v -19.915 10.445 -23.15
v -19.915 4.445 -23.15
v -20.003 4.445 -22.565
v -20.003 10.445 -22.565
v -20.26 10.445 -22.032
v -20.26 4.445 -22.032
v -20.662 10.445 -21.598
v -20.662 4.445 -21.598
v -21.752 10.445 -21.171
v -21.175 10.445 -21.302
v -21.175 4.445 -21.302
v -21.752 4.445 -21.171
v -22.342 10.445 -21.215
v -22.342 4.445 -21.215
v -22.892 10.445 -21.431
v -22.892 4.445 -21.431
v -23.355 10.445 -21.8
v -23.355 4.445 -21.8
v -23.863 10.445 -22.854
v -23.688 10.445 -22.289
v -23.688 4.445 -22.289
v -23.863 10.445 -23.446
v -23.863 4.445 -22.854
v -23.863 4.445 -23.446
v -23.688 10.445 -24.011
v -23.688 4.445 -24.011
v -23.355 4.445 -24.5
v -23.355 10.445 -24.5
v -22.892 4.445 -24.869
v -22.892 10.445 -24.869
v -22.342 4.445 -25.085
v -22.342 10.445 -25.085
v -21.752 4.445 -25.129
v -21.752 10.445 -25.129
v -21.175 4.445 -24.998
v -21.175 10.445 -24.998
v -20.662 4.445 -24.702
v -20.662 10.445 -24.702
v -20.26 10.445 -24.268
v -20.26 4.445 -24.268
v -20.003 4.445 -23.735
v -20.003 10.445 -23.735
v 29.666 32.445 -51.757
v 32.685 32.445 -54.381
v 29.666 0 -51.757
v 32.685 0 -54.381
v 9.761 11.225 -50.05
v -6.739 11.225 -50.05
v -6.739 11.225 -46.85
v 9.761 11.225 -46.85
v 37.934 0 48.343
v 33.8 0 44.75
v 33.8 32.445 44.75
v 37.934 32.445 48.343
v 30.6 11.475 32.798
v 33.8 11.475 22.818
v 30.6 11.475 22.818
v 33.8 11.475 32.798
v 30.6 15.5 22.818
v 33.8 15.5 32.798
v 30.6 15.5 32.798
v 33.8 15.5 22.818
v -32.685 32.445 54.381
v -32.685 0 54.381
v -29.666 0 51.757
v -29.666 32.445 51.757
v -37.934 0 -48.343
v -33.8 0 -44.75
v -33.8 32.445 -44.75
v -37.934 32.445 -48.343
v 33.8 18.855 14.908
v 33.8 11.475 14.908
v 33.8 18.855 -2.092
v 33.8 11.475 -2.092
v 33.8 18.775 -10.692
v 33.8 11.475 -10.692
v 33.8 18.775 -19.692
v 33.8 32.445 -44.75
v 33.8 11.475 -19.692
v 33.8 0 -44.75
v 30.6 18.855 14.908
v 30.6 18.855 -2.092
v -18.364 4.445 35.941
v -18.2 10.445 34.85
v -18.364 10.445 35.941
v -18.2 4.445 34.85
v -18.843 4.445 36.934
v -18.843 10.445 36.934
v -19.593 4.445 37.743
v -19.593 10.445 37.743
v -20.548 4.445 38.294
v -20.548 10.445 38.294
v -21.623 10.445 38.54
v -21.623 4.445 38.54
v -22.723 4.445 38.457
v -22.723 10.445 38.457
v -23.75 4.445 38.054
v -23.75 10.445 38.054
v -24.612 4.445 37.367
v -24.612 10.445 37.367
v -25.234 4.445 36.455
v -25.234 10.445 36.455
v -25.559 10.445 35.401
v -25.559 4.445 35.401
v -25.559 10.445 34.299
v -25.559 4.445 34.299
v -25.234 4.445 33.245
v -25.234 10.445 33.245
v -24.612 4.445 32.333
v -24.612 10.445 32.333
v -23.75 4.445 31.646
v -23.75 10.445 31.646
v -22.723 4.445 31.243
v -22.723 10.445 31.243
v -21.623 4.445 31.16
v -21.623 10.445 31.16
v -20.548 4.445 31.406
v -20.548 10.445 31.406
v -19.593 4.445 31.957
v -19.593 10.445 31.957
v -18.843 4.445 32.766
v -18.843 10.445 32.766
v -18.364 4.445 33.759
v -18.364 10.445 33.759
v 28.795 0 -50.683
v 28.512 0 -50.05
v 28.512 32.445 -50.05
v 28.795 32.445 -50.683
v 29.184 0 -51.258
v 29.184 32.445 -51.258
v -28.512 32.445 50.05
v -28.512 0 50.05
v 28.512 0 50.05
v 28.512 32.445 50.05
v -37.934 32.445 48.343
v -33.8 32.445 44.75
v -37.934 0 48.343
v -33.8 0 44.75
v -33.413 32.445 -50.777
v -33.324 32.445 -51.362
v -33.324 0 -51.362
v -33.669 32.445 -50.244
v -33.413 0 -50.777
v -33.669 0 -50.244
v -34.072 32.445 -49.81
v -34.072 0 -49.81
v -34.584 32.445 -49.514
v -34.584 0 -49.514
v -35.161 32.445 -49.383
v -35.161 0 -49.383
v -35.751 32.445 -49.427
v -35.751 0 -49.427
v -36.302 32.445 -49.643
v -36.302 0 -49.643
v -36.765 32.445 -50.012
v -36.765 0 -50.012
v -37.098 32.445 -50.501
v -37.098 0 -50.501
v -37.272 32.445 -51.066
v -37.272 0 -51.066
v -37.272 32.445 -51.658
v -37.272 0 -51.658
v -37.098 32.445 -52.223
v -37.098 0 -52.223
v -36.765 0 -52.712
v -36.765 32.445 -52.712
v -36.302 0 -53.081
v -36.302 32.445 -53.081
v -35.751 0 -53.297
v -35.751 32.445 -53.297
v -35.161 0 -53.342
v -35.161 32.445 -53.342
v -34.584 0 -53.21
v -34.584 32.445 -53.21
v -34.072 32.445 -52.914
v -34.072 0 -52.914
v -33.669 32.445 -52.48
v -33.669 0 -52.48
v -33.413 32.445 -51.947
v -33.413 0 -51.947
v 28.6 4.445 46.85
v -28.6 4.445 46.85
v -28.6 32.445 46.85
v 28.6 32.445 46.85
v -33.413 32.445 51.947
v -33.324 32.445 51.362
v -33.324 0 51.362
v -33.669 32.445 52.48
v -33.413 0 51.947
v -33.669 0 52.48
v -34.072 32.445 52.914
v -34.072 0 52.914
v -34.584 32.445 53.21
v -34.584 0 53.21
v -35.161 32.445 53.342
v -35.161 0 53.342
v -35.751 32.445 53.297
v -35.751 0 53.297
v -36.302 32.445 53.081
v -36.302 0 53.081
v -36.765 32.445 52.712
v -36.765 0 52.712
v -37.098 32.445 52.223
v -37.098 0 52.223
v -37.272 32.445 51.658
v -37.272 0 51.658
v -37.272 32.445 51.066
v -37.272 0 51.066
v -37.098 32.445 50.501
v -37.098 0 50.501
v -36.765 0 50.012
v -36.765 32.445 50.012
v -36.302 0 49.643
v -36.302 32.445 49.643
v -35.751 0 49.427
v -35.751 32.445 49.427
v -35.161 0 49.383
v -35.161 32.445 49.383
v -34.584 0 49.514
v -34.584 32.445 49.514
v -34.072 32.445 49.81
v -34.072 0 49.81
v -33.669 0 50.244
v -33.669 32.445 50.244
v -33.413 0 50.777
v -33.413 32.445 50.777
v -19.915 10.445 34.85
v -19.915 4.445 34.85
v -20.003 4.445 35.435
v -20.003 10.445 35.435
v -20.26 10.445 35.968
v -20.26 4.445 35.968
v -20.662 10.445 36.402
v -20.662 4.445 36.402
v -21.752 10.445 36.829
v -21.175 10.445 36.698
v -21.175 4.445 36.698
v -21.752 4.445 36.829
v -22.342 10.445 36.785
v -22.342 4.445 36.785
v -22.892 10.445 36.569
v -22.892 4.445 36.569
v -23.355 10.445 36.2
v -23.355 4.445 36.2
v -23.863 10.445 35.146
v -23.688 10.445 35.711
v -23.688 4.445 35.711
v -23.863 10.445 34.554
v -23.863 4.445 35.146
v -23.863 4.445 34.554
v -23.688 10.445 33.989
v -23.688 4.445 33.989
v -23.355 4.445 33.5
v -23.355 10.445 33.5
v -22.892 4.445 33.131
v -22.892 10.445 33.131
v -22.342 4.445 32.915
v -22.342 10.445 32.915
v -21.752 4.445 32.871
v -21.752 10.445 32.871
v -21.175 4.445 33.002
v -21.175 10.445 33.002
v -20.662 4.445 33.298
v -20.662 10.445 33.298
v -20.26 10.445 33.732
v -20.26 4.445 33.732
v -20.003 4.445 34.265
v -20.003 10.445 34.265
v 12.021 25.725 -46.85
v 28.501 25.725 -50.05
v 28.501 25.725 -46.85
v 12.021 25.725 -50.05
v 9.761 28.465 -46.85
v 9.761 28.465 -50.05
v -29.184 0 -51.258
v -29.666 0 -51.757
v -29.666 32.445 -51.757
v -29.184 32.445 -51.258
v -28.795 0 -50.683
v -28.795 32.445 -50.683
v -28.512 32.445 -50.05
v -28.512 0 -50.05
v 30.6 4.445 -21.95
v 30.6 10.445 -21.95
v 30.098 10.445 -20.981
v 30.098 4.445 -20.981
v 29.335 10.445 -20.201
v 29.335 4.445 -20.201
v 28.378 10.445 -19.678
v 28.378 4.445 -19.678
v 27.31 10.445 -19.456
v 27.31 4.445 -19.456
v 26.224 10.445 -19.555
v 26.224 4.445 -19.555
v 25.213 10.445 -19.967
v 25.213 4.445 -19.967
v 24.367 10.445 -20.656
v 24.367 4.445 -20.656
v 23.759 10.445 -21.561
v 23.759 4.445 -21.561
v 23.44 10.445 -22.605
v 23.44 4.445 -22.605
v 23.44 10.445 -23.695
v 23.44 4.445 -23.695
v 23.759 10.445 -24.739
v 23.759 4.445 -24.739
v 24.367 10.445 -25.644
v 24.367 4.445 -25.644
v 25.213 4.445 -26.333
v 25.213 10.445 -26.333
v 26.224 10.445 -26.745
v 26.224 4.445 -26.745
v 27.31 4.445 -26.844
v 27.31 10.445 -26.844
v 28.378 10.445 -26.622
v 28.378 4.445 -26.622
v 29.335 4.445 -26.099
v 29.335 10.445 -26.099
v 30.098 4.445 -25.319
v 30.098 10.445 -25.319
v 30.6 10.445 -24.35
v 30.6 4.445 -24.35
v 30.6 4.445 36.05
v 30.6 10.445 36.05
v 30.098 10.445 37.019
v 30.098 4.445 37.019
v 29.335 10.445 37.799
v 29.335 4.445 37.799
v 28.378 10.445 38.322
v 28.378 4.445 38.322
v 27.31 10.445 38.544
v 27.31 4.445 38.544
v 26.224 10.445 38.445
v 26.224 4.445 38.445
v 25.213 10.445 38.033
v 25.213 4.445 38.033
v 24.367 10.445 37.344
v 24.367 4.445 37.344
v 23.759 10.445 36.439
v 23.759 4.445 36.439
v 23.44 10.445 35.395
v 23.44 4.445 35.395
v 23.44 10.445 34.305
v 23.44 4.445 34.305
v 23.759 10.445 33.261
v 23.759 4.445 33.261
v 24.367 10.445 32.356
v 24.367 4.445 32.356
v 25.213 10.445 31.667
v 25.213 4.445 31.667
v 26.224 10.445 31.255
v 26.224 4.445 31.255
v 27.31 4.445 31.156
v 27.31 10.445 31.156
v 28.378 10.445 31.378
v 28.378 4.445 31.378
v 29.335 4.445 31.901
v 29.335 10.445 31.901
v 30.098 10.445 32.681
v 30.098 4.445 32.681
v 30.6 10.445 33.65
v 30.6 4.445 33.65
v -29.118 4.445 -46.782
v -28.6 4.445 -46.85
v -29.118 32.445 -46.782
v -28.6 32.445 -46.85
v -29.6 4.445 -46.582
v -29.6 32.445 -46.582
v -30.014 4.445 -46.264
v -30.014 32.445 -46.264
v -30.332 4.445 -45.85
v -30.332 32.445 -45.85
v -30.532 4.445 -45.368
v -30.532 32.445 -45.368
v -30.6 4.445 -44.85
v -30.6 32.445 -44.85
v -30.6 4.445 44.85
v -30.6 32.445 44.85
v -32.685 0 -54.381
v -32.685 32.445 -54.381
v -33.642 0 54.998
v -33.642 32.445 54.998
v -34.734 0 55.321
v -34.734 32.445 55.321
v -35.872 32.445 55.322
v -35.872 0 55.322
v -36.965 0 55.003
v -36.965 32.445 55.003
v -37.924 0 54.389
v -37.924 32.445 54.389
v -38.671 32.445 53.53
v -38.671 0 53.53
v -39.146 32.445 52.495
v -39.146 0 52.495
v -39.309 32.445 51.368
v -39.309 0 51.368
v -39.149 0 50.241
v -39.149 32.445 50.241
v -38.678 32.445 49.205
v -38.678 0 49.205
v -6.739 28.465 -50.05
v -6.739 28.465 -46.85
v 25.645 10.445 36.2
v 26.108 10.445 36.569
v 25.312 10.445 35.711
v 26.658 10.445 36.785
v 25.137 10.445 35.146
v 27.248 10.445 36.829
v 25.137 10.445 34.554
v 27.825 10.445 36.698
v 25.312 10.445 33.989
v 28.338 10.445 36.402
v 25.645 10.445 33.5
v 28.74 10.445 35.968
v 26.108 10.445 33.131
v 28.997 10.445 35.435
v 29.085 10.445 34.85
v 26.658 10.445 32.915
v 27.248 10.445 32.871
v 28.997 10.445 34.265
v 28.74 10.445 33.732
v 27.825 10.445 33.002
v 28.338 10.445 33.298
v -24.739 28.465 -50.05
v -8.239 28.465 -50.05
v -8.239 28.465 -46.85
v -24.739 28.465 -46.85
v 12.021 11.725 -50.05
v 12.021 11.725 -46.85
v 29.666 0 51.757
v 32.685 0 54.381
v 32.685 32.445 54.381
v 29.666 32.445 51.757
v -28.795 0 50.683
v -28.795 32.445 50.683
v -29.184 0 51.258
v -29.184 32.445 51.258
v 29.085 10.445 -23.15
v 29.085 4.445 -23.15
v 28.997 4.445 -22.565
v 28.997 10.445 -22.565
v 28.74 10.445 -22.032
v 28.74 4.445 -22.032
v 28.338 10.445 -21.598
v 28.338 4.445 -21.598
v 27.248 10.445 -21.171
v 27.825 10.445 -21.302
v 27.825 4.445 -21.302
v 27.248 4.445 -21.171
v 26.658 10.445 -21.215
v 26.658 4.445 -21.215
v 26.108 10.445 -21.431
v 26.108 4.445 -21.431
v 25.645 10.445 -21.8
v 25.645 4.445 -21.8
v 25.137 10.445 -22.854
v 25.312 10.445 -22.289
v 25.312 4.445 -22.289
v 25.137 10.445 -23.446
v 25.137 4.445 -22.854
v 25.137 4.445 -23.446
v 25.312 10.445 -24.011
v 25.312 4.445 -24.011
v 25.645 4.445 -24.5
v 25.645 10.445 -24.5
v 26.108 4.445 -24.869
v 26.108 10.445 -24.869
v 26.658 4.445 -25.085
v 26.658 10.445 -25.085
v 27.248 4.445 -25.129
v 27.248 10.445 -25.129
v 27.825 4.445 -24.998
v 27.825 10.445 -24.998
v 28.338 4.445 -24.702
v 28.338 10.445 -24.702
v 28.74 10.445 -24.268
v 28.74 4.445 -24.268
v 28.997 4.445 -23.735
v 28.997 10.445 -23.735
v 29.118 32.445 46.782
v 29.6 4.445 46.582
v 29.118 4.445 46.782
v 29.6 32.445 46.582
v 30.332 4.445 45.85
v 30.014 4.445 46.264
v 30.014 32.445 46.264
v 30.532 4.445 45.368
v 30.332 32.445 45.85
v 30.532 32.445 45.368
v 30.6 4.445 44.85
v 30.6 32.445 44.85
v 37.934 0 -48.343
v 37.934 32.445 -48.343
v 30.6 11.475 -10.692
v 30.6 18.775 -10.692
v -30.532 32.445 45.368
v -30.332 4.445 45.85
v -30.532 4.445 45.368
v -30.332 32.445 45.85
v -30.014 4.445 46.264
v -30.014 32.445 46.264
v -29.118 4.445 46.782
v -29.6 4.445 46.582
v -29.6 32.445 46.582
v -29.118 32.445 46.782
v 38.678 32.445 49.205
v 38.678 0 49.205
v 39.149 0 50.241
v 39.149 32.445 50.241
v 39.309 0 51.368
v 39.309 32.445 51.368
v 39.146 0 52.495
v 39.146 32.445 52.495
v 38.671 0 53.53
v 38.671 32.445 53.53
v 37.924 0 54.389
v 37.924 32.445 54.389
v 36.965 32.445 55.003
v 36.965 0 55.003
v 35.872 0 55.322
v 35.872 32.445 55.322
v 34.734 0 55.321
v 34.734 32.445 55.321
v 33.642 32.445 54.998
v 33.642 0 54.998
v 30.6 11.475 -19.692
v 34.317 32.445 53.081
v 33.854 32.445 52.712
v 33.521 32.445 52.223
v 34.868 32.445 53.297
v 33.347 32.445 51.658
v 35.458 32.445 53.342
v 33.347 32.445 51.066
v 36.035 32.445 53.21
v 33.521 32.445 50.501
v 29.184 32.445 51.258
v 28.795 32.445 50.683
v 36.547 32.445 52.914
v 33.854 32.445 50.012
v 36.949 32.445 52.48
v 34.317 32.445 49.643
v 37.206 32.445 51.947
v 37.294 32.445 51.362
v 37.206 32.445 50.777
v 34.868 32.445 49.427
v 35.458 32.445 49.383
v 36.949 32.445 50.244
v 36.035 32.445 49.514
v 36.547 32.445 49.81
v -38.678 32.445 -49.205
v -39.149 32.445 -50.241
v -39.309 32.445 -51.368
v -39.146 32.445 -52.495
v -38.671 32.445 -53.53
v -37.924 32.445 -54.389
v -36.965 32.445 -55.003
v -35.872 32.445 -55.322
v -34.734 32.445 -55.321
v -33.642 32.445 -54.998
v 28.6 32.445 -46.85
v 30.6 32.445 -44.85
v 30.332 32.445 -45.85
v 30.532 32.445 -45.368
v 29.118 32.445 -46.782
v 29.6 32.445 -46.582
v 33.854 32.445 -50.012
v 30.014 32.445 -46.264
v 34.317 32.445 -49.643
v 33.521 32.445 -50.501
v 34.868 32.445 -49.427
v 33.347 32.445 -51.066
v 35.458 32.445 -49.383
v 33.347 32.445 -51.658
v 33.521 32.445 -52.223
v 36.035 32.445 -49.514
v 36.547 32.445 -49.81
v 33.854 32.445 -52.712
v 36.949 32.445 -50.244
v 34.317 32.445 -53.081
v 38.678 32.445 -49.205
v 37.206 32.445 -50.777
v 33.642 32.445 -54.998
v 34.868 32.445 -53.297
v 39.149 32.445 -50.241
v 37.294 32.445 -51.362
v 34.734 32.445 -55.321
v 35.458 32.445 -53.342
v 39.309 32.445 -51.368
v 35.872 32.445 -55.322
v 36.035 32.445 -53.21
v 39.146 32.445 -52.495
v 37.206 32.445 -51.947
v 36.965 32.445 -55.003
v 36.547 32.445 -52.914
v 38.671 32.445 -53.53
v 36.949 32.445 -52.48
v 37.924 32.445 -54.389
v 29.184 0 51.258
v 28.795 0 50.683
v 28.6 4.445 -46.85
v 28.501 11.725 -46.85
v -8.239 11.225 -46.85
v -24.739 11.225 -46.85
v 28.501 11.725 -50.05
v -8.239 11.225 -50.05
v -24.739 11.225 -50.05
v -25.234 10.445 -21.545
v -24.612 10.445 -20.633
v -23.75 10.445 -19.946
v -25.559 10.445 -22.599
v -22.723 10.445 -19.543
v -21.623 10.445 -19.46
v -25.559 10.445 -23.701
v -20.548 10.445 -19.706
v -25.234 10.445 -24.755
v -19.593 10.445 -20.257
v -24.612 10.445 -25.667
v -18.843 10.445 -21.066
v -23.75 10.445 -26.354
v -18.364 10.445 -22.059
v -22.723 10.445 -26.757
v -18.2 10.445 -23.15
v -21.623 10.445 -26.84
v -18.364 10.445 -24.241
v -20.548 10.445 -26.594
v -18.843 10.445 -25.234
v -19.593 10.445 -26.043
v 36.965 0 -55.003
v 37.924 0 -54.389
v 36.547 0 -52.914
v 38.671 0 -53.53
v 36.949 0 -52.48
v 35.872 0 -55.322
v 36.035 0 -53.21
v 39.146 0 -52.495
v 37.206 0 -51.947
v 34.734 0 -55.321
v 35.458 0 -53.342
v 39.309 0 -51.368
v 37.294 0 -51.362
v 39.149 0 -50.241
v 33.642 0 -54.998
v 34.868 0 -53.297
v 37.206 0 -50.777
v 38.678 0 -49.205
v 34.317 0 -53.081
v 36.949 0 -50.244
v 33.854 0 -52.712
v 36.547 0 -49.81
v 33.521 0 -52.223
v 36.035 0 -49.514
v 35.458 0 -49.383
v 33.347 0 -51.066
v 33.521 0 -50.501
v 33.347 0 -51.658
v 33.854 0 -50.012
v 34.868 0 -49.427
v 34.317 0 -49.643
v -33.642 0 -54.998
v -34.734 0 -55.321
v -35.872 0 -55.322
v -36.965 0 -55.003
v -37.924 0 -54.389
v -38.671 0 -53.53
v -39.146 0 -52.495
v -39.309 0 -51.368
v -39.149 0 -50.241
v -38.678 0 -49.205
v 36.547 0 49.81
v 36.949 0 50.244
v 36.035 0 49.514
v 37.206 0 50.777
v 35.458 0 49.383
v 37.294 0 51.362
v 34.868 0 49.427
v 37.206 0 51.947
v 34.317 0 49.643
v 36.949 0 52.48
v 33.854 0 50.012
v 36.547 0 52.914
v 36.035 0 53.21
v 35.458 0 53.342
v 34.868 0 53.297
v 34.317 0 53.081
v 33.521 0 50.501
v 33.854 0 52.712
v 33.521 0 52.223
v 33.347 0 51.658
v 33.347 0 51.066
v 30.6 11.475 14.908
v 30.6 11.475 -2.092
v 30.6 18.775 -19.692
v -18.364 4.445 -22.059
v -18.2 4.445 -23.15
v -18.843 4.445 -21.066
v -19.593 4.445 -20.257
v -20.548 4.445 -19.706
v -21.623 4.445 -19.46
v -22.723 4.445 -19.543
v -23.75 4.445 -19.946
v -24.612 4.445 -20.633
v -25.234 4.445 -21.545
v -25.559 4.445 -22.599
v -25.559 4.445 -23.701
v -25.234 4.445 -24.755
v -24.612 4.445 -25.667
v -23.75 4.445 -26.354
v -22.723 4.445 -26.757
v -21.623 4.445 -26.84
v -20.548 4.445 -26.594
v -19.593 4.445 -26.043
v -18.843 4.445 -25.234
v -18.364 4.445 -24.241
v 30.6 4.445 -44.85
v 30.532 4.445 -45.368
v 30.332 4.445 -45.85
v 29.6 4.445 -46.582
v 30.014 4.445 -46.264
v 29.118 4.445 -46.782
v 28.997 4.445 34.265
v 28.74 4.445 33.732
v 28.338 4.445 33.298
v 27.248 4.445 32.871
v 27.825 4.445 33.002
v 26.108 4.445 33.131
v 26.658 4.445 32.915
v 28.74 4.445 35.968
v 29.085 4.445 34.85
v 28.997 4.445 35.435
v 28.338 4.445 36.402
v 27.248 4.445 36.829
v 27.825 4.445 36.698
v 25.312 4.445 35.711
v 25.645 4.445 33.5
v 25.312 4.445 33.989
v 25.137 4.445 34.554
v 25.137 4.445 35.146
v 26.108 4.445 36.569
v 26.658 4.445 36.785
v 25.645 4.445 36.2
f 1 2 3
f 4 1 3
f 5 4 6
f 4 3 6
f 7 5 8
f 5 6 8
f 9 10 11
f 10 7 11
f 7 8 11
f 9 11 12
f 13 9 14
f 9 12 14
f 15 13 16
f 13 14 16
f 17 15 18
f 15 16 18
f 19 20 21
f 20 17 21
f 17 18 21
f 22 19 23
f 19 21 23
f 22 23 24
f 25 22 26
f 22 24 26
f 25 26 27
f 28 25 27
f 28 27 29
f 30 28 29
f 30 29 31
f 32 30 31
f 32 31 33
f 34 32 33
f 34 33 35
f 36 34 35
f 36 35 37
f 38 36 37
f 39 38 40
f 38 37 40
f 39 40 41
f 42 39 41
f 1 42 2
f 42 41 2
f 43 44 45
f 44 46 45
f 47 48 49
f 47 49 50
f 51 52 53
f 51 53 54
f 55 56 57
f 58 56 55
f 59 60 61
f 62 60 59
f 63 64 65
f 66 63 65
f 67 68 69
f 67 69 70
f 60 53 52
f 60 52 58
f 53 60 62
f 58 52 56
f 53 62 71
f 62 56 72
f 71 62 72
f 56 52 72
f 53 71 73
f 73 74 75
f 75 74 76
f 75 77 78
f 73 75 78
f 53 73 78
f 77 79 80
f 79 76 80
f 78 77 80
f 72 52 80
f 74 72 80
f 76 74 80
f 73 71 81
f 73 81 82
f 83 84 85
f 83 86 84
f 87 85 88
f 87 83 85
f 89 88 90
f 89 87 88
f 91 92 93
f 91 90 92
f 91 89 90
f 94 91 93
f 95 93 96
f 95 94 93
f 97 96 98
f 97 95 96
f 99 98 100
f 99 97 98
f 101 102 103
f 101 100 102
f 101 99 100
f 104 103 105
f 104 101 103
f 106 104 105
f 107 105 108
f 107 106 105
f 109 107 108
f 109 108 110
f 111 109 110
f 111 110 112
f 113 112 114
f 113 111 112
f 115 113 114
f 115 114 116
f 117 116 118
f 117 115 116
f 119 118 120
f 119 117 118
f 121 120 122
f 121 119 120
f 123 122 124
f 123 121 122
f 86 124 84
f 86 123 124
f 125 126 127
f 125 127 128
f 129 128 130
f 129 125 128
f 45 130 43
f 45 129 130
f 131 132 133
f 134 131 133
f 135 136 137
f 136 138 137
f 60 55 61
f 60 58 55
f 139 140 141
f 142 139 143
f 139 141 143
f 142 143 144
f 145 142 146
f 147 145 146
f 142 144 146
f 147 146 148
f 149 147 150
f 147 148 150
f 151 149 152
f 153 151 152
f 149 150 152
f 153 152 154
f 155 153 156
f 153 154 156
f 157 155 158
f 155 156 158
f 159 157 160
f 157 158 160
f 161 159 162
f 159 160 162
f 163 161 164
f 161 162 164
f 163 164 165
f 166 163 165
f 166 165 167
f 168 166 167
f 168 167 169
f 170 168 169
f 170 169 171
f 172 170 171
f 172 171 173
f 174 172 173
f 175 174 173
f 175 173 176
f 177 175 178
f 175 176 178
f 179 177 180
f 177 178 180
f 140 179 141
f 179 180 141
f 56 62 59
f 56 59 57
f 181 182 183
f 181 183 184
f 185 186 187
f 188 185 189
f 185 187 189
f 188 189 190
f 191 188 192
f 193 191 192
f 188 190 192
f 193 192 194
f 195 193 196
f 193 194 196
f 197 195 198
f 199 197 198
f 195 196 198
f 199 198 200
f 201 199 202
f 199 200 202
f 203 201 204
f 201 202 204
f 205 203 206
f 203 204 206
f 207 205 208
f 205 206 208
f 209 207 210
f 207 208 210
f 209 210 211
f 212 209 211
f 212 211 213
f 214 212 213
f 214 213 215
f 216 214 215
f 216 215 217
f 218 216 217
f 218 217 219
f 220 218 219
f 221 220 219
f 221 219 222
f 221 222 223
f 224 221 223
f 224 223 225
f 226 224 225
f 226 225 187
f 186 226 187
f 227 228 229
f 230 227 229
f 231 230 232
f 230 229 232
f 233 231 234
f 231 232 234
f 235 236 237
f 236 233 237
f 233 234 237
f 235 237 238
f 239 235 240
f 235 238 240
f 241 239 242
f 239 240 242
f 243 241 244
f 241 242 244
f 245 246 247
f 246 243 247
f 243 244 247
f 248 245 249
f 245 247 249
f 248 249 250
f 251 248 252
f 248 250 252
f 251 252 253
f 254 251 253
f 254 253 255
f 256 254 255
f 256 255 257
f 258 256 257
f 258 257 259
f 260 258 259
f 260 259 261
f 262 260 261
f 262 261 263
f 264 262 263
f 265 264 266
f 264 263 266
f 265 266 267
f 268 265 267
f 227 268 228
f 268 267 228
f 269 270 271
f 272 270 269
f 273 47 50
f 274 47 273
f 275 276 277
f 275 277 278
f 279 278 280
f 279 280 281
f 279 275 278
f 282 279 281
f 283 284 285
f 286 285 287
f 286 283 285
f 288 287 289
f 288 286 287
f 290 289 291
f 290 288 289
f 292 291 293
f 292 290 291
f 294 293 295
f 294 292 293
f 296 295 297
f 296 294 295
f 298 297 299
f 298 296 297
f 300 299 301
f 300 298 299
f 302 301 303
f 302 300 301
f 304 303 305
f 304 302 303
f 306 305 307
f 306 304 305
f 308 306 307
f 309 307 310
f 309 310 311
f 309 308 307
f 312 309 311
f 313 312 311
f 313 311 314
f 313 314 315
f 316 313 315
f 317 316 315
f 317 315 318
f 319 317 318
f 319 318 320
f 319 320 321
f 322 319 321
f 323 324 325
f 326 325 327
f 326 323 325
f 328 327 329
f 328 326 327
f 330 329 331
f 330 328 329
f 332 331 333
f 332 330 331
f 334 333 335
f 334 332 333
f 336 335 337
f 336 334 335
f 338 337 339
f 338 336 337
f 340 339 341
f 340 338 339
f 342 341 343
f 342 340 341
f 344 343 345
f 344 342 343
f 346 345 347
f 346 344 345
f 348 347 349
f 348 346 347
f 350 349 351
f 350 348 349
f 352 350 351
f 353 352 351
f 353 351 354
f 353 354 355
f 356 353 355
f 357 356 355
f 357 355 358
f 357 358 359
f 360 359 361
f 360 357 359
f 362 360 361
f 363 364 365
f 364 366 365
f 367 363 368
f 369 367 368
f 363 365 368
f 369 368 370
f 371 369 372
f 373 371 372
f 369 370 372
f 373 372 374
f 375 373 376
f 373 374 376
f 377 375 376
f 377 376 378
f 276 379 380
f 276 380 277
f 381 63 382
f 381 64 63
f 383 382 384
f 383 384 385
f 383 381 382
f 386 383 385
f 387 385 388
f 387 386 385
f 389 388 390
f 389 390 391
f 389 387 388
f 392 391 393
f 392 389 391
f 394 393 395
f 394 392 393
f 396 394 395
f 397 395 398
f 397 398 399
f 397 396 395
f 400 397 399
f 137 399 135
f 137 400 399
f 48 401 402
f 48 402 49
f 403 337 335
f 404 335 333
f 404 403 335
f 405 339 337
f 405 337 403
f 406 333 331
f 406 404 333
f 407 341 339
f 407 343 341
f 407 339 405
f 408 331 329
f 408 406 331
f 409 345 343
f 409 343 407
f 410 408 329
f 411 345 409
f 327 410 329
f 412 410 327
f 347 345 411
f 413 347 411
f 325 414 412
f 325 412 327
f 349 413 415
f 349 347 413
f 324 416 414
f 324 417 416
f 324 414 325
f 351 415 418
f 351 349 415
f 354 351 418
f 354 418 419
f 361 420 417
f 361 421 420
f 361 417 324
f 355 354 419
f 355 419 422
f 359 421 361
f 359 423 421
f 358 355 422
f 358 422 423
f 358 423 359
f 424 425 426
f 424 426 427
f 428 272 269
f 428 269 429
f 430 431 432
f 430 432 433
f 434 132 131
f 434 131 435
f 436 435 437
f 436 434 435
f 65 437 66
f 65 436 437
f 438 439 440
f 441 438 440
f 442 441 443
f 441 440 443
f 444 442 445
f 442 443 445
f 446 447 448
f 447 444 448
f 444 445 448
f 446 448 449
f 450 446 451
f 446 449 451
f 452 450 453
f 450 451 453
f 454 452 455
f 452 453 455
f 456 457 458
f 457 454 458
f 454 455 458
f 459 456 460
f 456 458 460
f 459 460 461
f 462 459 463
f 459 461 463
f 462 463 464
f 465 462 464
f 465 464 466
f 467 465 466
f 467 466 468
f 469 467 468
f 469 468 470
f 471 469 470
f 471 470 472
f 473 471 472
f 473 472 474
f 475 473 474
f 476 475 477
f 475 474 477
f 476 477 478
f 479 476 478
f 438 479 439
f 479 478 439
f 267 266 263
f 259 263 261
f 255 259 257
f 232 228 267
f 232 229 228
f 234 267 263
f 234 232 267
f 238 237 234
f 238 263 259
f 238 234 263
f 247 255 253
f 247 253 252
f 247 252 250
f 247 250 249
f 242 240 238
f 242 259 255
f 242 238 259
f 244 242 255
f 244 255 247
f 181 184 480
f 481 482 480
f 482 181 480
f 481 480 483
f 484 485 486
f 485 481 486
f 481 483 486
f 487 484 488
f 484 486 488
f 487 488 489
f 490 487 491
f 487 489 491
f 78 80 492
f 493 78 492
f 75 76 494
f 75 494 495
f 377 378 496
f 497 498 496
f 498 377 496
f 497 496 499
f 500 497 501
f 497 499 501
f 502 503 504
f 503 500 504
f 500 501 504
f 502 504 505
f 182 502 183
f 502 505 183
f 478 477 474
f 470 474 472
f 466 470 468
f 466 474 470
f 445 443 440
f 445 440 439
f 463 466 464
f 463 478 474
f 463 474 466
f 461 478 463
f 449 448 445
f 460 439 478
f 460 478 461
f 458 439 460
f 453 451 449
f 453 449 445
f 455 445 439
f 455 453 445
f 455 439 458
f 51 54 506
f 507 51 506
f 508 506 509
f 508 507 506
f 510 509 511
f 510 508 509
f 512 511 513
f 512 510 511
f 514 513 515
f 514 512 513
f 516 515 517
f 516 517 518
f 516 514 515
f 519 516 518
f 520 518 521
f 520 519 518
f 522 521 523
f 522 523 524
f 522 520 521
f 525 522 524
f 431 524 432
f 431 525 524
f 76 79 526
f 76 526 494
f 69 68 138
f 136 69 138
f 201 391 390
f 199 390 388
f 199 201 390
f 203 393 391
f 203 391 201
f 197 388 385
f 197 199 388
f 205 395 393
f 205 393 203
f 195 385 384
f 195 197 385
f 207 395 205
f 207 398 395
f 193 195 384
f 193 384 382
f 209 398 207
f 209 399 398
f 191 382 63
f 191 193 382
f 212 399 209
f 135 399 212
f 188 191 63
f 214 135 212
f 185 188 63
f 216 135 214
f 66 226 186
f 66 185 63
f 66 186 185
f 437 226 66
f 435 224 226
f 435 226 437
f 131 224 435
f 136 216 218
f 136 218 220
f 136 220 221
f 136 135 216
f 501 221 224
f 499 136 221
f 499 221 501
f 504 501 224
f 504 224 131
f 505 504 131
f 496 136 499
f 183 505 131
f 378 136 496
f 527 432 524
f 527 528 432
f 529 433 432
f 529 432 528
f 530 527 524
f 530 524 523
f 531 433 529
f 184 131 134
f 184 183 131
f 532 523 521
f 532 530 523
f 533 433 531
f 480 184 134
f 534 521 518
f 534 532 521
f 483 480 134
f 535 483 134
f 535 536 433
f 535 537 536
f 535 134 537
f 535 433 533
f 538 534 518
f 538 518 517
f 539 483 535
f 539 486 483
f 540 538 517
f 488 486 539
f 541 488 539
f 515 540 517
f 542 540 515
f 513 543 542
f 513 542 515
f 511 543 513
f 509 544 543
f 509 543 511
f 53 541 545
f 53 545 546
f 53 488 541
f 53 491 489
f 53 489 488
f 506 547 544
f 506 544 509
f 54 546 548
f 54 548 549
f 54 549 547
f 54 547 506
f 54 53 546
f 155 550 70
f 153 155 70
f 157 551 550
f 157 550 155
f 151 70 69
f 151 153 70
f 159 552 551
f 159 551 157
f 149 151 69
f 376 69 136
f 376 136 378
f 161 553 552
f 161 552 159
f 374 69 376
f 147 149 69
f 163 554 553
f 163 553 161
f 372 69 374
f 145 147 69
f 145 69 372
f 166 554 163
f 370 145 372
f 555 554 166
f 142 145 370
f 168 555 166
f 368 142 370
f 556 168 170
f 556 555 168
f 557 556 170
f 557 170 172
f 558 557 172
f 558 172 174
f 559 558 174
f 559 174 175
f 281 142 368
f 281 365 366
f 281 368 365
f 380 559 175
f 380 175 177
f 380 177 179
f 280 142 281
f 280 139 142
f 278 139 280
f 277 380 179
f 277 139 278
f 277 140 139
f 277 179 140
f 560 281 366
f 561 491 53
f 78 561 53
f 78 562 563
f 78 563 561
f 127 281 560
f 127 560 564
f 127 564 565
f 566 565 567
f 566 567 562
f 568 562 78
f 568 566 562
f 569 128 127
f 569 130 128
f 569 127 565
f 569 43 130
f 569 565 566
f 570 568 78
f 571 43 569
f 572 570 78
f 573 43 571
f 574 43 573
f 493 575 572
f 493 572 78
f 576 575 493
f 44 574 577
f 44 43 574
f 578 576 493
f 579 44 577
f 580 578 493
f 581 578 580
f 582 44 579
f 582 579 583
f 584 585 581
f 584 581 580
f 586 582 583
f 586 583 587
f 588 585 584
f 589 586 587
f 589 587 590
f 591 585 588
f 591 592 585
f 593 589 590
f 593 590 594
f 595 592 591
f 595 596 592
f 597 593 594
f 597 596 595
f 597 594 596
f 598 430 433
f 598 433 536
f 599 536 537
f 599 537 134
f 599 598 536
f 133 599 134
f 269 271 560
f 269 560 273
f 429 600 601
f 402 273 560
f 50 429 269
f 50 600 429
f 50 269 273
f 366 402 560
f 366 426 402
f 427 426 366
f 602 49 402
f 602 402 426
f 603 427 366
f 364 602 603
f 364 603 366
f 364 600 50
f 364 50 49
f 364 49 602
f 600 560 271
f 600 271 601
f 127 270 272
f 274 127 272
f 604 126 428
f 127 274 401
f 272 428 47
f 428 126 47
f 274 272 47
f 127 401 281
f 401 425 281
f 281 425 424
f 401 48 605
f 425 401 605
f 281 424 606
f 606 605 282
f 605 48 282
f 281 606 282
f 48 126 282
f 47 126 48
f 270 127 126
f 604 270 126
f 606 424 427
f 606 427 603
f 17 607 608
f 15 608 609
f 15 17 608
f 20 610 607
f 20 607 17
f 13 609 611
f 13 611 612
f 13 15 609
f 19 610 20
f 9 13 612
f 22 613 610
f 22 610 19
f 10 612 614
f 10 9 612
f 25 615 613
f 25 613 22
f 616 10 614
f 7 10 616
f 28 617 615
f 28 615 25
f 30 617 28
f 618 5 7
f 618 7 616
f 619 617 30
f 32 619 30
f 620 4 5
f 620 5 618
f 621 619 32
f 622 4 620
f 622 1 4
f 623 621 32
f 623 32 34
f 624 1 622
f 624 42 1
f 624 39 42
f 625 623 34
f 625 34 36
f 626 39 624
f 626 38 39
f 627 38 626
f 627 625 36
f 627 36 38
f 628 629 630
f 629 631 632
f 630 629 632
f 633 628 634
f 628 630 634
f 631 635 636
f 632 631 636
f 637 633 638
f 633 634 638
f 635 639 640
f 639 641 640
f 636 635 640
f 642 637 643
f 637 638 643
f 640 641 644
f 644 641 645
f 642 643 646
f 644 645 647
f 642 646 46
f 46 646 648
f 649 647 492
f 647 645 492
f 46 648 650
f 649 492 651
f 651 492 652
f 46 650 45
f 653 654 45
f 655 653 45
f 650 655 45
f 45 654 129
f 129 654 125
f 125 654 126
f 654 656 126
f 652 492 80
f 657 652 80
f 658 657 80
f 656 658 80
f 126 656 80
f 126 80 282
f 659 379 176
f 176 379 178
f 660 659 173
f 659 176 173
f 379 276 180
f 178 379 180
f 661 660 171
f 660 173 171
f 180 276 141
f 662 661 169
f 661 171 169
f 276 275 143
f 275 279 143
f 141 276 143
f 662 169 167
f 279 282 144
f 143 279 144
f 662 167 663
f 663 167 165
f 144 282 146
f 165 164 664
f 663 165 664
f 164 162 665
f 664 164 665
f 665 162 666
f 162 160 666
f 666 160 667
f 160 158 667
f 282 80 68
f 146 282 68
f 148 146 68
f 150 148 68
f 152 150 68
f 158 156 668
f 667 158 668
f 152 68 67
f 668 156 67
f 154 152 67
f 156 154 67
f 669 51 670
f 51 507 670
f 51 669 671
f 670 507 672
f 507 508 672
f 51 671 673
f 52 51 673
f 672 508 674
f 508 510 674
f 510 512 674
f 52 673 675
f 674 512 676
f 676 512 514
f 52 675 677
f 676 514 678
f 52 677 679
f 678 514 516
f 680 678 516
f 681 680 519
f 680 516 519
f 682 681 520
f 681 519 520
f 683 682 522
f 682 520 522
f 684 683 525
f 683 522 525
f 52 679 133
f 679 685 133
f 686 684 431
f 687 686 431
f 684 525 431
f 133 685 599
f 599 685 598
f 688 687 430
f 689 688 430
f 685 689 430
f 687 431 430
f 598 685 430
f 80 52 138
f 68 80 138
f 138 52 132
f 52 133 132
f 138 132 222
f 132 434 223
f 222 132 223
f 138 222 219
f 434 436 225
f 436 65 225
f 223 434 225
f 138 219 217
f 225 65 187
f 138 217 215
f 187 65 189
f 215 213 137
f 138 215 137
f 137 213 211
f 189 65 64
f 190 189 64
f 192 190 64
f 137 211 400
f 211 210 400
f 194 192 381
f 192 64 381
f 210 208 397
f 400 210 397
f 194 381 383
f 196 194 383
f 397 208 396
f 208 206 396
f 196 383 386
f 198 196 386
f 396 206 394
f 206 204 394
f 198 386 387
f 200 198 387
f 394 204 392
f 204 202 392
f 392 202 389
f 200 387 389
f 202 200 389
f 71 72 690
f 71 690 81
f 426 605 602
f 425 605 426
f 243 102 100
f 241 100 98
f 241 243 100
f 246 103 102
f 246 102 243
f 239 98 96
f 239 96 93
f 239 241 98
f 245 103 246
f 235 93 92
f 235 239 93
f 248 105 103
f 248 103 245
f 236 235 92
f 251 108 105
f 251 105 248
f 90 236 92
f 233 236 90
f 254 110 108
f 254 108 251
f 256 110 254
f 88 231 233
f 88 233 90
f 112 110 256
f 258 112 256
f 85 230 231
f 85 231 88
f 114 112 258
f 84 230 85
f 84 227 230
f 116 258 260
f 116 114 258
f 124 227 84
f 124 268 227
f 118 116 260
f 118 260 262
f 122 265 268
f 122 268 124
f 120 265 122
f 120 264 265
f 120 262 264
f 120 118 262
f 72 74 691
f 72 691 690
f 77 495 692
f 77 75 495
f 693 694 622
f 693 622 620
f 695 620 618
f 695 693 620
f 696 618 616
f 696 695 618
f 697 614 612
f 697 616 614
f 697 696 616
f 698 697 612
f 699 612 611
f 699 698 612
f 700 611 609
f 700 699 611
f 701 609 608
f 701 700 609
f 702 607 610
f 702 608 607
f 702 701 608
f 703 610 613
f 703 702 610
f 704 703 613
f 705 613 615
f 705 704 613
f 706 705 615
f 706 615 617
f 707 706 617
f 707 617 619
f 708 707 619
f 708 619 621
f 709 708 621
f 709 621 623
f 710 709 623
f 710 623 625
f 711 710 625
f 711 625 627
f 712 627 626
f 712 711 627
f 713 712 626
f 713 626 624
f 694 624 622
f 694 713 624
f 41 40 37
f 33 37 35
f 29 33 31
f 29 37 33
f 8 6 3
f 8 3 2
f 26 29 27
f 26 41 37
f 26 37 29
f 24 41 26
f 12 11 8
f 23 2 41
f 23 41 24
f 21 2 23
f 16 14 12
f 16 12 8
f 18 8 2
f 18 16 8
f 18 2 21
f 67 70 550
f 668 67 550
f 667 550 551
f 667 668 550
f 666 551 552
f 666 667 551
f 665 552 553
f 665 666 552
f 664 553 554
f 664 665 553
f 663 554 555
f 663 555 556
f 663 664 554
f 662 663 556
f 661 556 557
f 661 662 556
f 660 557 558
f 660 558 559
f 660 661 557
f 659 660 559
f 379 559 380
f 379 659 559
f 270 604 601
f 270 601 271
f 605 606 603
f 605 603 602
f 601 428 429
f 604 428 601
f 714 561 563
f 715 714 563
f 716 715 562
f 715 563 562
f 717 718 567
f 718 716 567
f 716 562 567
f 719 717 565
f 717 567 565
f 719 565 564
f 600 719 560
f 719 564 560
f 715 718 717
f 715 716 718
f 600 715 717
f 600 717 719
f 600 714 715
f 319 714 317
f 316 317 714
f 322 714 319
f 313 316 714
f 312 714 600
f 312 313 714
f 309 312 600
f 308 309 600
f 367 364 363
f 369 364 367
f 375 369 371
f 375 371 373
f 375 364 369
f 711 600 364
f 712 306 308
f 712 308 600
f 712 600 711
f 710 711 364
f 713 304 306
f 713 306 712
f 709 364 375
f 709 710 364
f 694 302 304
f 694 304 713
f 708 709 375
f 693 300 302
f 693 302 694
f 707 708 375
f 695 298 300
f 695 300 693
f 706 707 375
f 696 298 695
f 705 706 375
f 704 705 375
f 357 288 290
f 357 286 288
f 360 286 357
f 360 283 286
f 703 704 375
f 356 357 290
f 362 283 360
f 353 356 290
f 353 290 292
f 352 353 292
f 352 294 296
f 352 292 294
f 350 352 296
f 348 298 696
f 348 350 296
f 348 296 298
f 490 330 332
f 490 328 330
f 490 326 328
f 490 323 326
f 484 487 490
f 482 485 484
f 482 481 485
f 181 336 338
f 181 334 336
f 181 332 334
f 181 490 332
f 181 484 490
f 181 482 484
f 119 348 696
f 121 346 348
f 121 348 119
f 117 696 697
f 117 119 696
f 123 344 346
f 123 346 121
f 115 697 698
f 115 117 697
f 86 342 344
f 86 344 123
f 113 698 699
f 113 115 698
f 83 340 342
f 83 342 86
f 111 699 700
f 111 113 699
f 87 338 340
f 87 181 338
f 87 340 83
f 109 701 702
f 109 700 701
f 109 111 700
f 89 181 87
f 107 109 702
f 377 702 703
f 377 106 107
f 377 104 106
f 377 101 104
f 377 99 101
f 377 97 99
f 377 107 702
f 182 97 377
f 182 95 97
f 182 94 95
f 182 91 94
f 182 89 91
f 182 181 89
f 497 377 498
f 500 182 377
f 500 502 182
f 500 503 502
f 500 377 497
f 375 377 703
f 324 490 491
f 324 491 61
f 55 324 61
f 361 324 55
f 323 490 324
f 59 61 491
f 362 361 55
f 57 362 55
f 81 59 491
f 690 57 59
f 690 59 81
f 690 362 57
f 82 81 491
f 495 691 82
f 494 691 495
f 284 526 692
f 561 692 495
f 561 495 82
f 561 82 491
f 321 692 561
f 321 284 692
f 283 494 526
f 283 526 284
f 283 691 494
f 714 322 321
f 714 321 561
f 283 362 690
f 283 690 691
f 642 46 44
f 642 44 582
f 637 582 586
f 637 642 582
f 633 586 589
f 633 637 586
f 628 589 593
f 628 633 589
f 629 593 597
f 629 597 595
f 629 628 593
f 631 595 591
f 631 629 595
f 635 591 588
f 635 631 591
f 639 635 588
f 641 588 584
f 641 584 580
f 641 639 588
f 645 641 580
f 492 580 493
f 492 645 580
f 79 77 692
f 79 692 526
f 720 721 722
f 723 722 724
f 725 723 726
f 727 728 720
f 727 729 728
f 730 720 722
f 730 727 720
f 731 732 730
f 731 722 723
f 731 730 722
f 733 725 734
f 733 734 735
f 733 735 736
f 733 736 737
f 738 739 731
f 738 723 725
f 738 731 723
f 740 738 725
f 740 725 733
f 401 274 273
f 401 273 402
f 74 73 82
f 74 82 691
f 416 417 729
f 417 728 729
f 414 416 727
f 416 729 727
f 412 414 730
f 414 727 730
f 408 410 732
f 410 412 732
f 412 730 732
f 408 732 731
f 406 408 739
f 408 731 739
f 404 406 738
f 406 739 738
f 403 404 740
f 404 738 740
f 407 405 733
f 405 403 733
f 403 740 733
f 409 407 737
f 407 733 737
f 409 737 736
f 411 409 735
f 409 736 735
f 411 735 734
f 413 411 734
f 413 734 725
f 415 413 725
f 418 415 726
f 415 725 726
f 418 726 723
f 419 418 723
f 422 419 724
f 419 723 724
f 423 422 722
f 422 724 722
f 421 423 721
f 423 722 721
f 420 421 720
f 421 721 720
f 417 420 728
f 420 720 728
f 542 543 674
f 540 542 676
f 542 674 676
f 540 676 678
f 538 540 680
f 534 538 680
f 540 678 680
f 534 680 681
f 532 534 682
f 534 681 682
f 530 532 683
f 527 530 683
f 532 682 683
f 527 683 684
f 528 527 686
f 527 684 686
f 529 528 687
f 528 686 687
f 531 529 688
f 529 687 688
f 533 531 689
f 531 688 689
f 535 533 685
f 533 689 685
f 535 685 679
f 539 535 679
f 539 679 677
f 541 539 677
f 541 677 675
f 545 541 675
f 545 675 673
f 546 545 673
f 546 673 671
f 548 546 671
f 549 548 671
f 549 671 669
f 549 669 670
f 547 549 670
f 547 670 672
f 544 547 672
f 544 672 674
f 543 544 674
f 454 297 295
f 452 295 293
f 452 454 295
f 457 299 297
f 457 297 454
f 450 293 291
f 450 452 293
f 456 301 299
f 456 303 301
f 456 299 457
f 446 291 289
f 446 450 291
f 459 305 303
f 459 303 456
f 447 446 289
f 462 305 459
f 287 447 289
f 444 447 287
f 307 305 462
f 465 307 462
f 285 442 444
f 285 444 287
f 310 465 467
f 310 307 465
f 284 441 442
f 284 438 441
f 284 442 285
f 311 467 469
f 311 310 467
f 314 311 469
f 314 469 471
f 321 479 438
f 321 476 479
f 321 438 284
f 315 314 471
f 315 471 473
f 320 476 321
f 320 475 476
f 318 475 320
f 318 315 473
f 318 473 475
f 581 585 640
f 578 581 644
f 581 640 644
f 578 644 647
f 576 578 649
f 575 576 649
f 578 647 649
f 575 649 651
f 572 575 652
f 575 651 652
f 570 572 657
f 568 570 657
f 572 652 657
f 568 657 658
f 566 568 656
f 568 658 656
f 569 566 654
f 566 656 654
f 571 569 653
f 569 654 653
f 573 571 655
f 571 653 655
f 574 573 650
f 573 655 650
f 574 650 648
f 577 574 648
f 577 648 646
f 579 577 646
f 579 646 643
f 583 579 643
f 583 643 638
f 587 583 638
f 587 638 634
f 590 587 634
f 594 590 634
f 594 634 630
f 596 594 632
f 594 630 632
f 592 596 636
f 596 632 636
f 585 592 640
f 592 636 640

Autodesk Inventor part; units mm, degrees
ref_plane "YZ Plane" through (0, 0, 0) normal (1, 0, 0) x (0, 1, 0)
ref_plane "XZ Plane" through (0, 0, 0) normal (0, 1, 0) x (-1, 0, 0)
ref_plane "XY Plane" through (0, 0, 0) normal (0, 0, 1) x (1, 0, 0)
sketch "Sketch1" plane through (0, 0, 0) normal (0, 1, 0) x (-1, 0, 0)
  line L0 (-33.8, -50.05) -> (33.8, -50.05)
  line L1 (33.8, -50.05) -> (33.8, 50.05)
  line L2 (33.8, 50.05) -> (-33.8, 50.05)
  line L3 (-33.8, 50.05) -> (-33.8, -50.05)
  line L4 (-33.8, -50.05) -> (33.8, 50.05) construction
  line L5 (33.8, -50.05) -> (-33.8, 50.05) construction
  point P0 (0, 0)
  dimension "d0" = 67.6
  dimension "d1" = 100.1
extrude "Extrusion1" add sketch "Sketch1" along normal blind 4.445
sketch "Sketch2" plane through (0, 4.445, 0) normal (0, 1, 0) x (1, 0, 0)
  line L0 (30.6, 46.85) -> (-30.6, 46.85)
  line L1 (-30.6, 46.85) -> (-30.6, -46.85)
  line L2 (-30.6, -46.85) -> (30.6, -46.85)
  line L3 (30.6, -46.85) -> (30.6, 46.85)
  line L4 (30.6, 46.85) -> (-30.6, -46.85) construction
  line L5 (-30.6, 46.85) -> (30.6, -46.85) construction
  line L6 (-33.8, 50.05) -> (-33.8, -50.05) projected
  line L7 (-33.8, -50.05) -> (33.8, -50.05) projected
  line L8 (33.8, 50.05) -> (-33.8, 50.05) projected
  line L9 (33.8, -50.05) -> (33.8, 50.05) projected
  line L10 (27.4, -43.65) -> (33.8, -50.05) construction
  line L11 (24.9431, -46.85) -> (30.9716, -52.8784)
  line L12 (36.6284, -47.2216) -> (30.6, -41.1931)
  arc A0 (30.9716, -52.8784) -> (36.6284, -47.2216) centre (33.8, -50.05) ccw
  circle A1 centre (33.8, -50.05) radius 1.375
  point P0 (0, 0)
  dimension "d4" = 3.2
  dimension "d5" = 3.2
  dimension "d22" = 8
  dimension "d23" = 2.75
extrude "Extrusion2" add sketch "Sketch2" along normal blind 28 contours L0 L1 L2 L11 L7 L6 L8 L9 L12 L3 | L12 L9 A1 L7 L11 L2 L3 | L9 L7 A1 picked at (32.9402, -49.7491)
sketch "Sketch4" plane through (0, 0, 0) normal (0, -1, 0) x (1, 0, 0)
  line L0 (32.2906, 48.7379) -> (35.3094, 51.3621) construction
  line L1 (33.8, 50.05) -> (33.8, -50.05) projected
  line L2 (33.8, 44.7499) -> (37.9337, 48.3433)
  line L3 (32.6852, 54.381) -> (29.6663, 51.7567)
  arc A0 (29.6663, 51.7567) -> (28.5119, 50.05) centre (32.2906, 48.7379) ccw
  arc A1 (37.9337, 48.3433) -> (32.6852, 54.381) centre (35.3094, 51.3621) ccw
  line L4 (-33.8, 50.05) -> (33.8, 50.05) projected
  line L5 (28.5119, 50.05) -> (33.8, 50.05)
  line L6 (33.8, 50.05) -> (33.8, 44.7499)
  circle A2 centre (35.3094, 51.3621) radius 1.985
  line L7 (0, 50.05) -> (0, -50.05) construction
  line L8 (33.8, -50.05) -> (-33.8, -50.05) construction
  line L9 (33.8, 0) -> (-33.3, 0) construction
  line L10 (33.8, -50.05) -> (33.8, 50.05)
  line L11 (33.8, -44.7499) -> (37.9337, -48.3433)
  line L12 (32.6852, -54.381) -> (29.6663, -51.7567)
  arc A3 (28.5119, -50.05) -> (29.6663, -51.7567) centre (32.2906, -48.7379) ccw
  arc A4 (32.6852, -54.381) -> (37.9337, -48.3433) centre (35.3094, -51.3621) ccw
  line L13 (-33.8, -50.05) -> (33.8, -50.05)
  circle A5 centre (35.3094, -51.3621) radius 1.985
  line L14 (-33.8, 50.05) -> (-33.8, -50.05)
  line L15 (-33.8, 44.7499) -> (-37.9337, 48.3433)
  line L16 (-32.6852, 54.381) -> (-29.6663, 51.7567)
  arc A6 (-28.5119, 50.05) -> (-29.6663, 51.7567) centre (-32.2906, 48.7379) ccw
  arc A7 (-32.6852, 54.381) -> (-37.9337, 48.3433) centre (-35.3094, 51.3621) ccw
  line L17 (-28.5119, 50.05) -> (-33.8, 50.05)
  circle A8 centre (-35.3094, 51.3621) radius 1.985
  arc A9 (-37.9337, -48.3433) -> (-32.6852, -54.381) centre (-35.3094, -51.3621) ccw
  line L18 (-33.8, -44.7499) -> (-37.9337, -48.3433)
  line L19 (-32.6852, -54.381) -> (-29.6663, -51.7567)
  arc A10 (-29.6663, -51.7567) -> (-28.5119, -50.05) centre (-32.2906, -48.7379) ccw
  circle A11 centre (-35.3094, -51.3621) radius 1.985
  line L20 (-28.5119, -50.05) -> (-33.8, -50.05)
  line L21 (-33.8, -50.05) -> (-33.8, 50.05)
  point P0 (0, 0)
  point P1 (-28.5119, -50.05)
  point P2 (-33.8, -44.7499)
  point P3 (-28.5119, 50.05)
  point P4 (33.8, -44.7499)
  dimension "d24" = 2
  dimension "d25" = 8
  dimension "d26" = 131
  dimension "d27" = 3.97
extrude "Extrusion4" add sketch "Sketch4" against normal up to surface (32.445 mm away) contours L4 A0 L3 A1 L2 L1 | L11 A4 L12 A3 L13 L1 | L4 L14 L15 A7 L16 A6 | A10 L19 A9 L18 L14 L13
fillet "Fillet2" radius 2 4 edges at (30.6, 18.445, -46.85) (-30.6, 18.445, -46.85) (-30.6, 18.445, 46.85) (30.6, 18.445, 46.85)
sketch "Sketch14" plane through (0, 4.445, 0) normal (0, 1, 0) x (1, 0, 0)
  circle A0 centre (27.1, -34.85) radius 3.7
  circle A1 centre (27.1, -34.85) radius 1.985
  line L0 (28.6, -46.85) -> (-28.6, -46.85) projected
  line L1 (30.6, 44.85) -> (30.6, -44.85) projected
  line L2 (-28.6, -46.85) -> (28.6, -46.85) construction
  line L3 (0, -46.85) -> (0, 50.05) construction
  line L4 (28.5119, 50.05) -> (-28.5119, 50.05) construction
  circle A2 centre (27.1, 23.15) radius 3.7
  circle A3 centre (27.1, 23.15) radius 1.985
  line L5 (-30.6, 44.85) -> (-30.6, -44.85) construction
  line L6 (-30.6, 0) -> (30.6, 0) construction
  line L7 (30.6, -44.85) -> (30.6, 44.85) construction
  circle A4 centre (-21.9, -34.85) radius 3.7
  circle A5 centre (-21.9, -34.85) radius 1.985
  circle A6 centre (-21.9, 23.15) radius 1.985
  circle A7 centre (-21.9, 23.15) radius 3.7
  point P0 (0, 0)
  dimension "d114" = 7.4
  dimension "d115" = 3.97
  dimension "d116" = 12
  dimension "d117" = 3.5
  dimension "d120" = 58
  dimension "d127" = 49
sketch "Sketch15" plane through (0, 4.445, 0) normal (0, 1, 0) x (1, 0, 0)
  point P0 (0, 0)
extrude "Extrusion10" add sketch "Sketch14" along normal blind 6
sketch "Sketch16" plane through (33.8, 0, 44.7499) normal (1, 0, 0) x (0, 0, -1)
  line L0 (12.9515, 13.2621) -> (12.9515, 13.455) projected
  line L1 (20.9323, 13.455) -> (20.9323, 13.2621) projected
  line L2 (13.9419, 14.5004) -> (19.9419, 14.5004) projected
  line L3 (88.3241, 11.975) -> (9.3999, 11.975) projected
  line L4 (21.9323, 11.475) -> (11.9515, 11.475)
  line L5 (11.9515, 11.475) -> (11.9515, 15.5004)
  line L6 (11.9515, 15.5004) -> (21.9323, 15.5004)
  line L7 (21.9323, 15.5004) -> (21.9323, 11.475)
  line L8 (30.8419, 17.055) -> (30.8419, 14.5766) projected
  line L9 (45.8419, 14.5766) -> (45.8419, 17.055) projected
  line L10 (45.0419, 17.855) -> (31.6419, 17.855) projected
  line L11 (46.8419, 11.475) -> (29.8419, 11.475)
  line L12 (29.8419, 11.475) -> (29.8419, 18.855)
  line L13 (29.8419, 18.855) -> (46.8419, 18.855)
  line L14 (46.8419, 18.855) -> (46.8419, 11.475)
  line L15 (56.4419, 17.775) -> (56.4419, 11.775) projected
  line L16 (63.4419, 11.775) -> (63.4419, 17.775) projected
  line L17 (63.4419, 17.775) -> (59.9419, 17.775) projected
  line L18 (59.9419, 17.775) -> (56.4419, 17.775) projected
  line L19 (64.4419, 11.475) -> (55.4419, 11.475)
  line L20 (55.4419, 11.475) -> (55.4419, 18.775)
  line L21 (55.4419, 18.775) -> (64.4419, 18.775)
  line L22 (64.4419, 18.775) -> (64.4419, 11.475)
  point P0 (44.7499, 0)
  dimension "d134" = 1
  dimension "d135" = 0.5
  dimension "d136" = 1
  dimension "d137" = 1
  dimension "d138" = 1
  dimension "d139" = 0.5
  dimension "d140" = 1
  dimension "d141" = 1
  dimension "d142" = 0.5
  dimension "d143" = 1
  dimension "d144" = 1
  dimension "d145" = 1
extrude "Extrusion11" cut sketch "Sketch16" against normal up to surface (3.2 mm away)
sketch "Sketch17" plane through (28.5119, 0, -50.05) normal (0, 0, -1) x (-1, 0, 0)
  line L0 (16.1912, 11.975) -> (16.1912, 25.475) projected
  line L1 (0.3112, 11.975) -> (0.3112, 25.475) projected
  line L2 (0.3112, 25.475) -> (16.1912, 25.475) projected
  line L3 (50.9119, 11.975) -> (0.9119, 11.975) projected
  line L4 (16.4912, 11.725) -> (0.0112, 11.725)
  line L5 (0.0112, 11.725) -> (0.0112, 25.725)
  line L6 (0.0112, 25.725) -> (16.4912, 25.725)
  line L7 (16.4912, 25.725) -> (16.4912, 11.725)
  line L8 (19.4512, 18.7546) -> (19.4512, 21.7546) projected
  line L9 (34.5512, 21.7546) -> (34.5512, 18.7546) projected
  line L10 (24.0012, 27.465) -> (30.0012, 27.465) projected
  line L11 (35.2512, 11.225) -> (18.7512, 11.225)
  line L12 (18.7512, 11.225) -> (18.7512, 28.465)
  line L13 (18.7512, 28.465) -> (35.2512, 28.465)
  line L14 (35.2512, 28.465) -> (35.2512, 11.225)
  line L15 (37.4512, 18.7546) -> (37.4512, 21.7546) projected
  line L16 (52.5512, 21.7546) -> (52.5512, 18.7546) projected
  line L17 (42.0012, 27.465) -> (48.0012, 27.465) projected
  line L18 (53.2512, 11.225) -> (36.7512, 11.225)
  line L19 (36.7512, 11.225) -> (36.7512, 28.465)
  line L20 (36.7512, 28.465) -> (53.2512, 28.465)
  line L21 (53.2512, 28.465) -> (53.2512, 11.225)
  point P0 (28.5119, 0)
  point P1 (18.7512, 11.975)
  point P2 (35.2512, 11.975)
  dimension "d148" = 0.3
  dimension "d149" = 0.3
  dimension "d150" = 0.25
  dimension "d151" = 0.25
  dimension "d154" = 0.7
  dimension "d155" = 0.7
  dimension "d156" = 1
  dimension "d157" = 0.75
  dimension "d158" = 1
  dimension "d159" = 0.7
  dimension "d160" = 0.7
  dimension "d161" = 0.75
extrude "Extrusion12" cut sketch "Sketch17" against normal up to surface (3.2 mm away)
properties part number "Case Rev D" material "ABS Plastic"
